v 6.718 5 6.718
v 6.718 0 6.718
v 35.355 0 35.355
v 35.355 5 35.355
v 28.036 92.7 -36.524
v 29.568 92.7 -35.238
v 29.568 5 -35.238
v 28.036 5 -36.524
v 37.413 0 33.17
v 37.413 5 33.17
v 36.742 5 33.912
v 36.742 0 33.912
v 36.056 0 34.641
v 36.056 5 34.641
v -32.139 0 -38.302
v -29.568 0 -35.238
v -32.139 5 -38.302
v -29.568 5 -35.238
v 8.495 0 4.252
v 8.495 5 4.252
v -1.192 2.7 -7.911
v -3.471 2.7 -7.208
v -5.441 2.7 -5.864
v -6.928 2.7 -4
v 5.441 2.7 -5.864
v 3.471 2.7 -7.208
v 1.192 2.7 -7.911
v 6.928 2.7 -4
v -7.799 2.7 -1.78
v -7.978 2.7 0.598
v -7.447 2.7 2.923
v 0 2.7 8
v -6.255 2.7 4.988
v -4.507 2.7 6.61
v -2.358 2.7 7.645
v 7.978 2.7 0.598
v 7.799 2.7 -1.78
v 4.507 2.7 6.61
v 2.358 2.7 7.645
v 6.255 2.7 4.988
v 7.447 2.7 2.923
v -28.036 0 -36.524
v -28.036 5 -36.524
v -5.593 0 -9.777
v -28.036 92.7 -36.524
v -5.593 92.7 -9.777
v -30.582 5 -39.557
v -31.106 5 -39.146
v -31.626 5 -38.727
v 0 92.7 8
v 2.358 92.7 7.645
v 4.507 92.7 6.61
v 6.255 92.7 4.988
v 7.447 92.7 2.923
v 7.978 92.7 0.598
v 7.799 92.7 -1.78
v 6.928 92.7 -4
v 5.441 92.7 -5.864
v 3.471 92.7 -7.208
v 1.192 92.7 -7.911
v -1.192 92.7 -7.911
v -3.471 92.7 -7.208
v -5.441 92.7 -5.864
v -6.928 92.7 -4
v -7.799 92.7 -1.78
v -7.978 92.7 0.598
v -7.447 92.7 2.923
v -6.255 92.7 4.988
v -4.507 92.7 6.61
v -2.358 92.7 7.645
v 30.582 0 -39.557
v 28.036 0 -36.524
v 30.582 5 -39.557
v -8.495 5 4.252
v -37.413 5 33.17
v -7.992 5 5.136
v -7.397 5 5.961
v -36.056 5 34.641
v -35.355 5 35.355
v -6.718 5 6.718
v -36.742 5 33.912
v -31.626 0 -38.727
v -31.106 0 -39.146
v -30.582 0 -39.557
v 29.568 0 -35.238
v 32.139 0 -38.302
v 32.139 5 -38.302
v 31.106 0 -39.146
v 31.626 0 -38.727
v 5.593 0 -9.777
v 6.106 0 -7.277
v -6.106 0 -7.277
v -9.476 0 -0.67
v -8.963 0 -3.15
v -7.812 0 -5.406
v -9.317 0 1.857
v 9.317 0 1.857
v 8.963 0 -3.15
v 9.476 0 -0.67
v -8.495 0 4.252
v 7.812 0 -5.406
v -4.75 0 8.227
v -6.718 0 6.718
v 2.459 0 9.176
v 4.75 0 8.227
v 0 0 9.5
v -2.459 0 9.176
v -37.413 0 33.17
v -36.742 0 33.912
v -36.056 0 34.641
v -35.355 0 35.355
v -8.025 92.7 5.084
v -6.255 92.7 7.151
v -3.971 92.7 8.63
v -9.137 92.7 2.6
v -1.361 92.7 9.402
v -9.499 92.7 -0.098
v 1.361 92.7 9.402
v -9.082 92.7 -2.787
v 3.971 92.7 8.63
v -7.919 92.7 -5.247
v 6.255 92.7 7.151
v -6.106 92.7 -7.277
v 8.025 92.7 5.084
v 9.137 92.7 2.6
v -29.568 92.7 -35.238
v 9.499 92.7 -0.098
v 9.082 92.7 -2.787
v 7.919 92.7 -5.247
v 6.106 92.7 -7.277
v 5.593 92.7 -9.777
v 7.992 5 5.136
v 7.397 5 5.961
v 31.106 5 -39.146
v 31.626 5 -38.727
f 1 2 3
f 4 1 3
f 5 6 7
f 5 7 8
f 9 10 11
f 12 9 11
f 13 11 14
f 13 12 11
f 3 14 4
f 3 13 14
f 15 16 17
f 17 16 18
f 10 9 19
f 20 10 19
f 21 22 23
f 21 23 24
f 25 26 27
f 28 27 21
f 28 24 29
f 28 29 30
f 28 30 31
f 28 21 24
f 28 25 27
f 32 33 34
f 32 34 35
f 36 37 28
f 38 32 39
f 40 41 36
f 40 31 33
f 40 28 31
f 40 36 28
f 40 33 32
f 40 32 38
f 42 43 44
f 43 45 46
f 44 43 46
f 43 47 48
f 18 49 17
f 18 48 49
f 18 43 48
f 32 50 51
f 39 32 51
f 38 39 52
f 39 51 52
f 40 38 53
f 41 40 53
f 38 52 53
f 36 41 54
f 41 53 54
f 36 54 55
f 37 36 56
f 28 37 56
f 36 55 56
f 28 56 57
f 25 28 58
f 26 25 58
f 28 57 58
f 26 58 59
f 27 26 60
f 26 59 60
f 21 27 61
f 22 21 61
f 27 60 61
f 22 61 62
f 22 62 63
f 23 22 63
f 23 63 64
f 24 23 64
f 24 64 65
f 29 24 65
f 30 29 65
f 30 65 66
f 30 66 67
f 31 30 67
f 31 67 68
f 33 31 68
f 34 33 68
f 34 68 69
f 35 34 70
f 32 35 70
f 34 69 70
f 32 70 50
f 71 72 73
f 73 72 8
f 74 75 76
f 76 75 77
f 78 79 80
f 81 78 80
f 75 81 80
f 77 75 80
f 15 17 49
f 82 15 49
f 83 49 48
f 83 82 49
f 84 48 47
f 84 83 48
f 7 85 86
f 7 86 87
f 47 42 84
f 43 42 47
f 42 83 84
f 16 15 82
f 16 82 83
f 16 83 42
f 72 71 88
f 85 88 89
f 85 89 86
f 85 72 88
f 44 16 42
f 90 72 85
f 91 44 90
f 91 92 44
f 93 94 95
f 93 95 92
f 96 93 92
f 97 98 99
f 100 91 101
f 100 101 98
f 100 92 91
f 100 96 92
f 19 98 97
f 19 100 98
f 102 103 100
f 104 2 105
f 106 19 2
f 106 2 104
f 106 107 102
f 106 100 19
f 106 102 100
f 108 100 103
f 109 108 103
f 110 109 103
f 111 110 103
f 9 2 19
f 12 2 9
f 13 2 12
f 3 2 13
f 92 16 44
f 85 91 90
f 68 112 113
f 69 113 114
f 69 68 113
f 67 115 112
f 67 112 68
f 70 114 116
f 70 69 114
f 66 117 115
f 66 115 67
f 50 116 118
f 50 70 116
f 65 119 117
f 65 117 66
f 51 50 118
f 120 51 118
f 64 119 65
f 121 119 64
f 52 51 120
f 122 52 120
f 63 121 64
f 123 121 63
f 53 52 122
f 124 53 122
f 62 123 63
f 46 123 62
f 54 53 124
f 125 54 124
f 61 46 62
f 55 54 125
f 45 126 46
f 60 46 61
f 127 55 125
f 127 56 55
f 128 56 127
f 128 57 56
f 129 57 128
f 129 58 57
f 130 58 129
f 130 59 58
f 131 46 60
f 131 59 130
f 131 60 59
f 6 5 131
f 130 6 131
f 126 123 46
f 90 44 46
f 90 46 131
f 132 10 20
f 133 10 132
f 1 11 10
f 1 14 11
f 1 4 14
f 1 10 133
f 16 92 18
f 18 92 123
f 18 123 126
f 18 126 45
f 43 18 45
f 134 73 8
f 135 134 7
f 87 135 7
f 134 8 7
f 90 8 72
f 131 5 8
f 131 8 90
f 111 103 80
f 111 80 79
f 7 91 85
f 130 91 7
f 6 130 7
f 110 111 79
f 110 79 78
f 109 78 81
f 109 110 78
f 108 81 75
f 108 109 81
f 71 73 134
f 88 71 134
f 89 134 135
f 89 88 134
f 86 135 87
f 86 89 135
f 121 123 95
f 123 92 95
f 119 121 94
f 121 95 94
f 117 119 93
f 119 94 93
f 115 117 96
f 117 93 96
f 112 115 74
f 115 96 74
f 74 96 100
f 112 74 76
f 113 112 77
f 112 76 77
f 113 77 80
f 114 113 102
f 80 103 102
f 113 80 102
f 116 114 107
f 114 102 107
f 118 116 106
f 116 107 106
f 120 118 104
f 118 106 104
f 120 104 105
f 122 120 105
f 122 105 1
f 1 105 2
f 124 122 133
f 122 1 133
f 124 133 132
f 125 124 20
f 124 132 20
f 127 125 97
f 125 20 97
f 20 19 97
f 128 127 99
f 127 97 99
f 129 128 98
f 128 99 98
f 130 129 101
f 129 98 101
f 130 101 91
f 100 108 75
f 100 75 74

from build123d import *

# Parameters (mm, degrees)
SKETCH1_R           = 9.5
BOSS_EXTRUDE1_DEPTH = 92.7
EXTRUDE_THIN1_DEPTH = 92.7
SKETCH13_W          = 2
SKETCH13_H          = 5
BOSS_EXTRUDE8_DEPTH = 5
EXTRUDE_THIN3_DEPTH = 5
SKETCH15_W          = 12.212964584
SKETCH15_H          = 2.5
BOSS_EXTRUDE9_DEPTH = 92.7
SKETCH16_R          = 8
CUT_EXTRUDE1_DEPTH  = 90
SKETCH17_R          = 55
SKETCH17_R_2        = 50
CUT_EXTRUDE2_DEPTH  = 5


with BuildPart() as part:
    # Sketch1 → Boss-Extrude1 (new body)
    with BuildSketch(Plane(origin=(0, 0, 0), x_dir=(1, 0, 0), z_dir=(0, 1, 0))):
        with Locations(Location((0, 0, 0), (0, 0, 270))):
            Circle(SKETCH1_R)
    extrude(amount=BOSS_EXTRUDE1_DEPTH)

    # Sketch2 → Extrude-Thin1 (add)
    with BuildSketch(Plane(origin=(0, 92.7, 0), x_dir=(1, 0, 0), z_dir=(0, 1, 0))):
        Polygon((0, 0), (-29.568230046, 35.238044383), (-28.036141159, 36.523619603), (1.532088886, 1.285575219), align=None)
    extrude_thin1 = extrude(amount=-EXTRUDE_THIN1_DEPTH)

    # Sketch13 → Boss-Extrude8 (add)
    with BuildSketch(Plane(origin=(-29.568230046, 0, -35.238044383), x_dir=(-0.7660444431189722, 0, 0.6427876096865464), z_dir=(-0.6427876096865464, 0, -0.7660444431189722))):
        with Locations((-1, 2.5)):
            Rectangle(SKETCH13_W, SKETCH13_H)
    boss_extrude8 = extrude(amount=BOSS_EXTRUDE8_DEPTH)

    # Mirror1: Extrude-Thin1, Boss-Extrude8 across plane
    add(extrude_thin1.mirror(Plane(origin=(0, 0, 0), x_dir=(0, 0, 1), z_dir=(1, 0, 0))))
    add(boss_extrude8.mirror(Plane(origin=(0, 0, 0), x_dir=(0, 0, 1), z_dir=(1, 0, 0))))

    # Sketch14 → Extrude-Thin3 (add)
    with BuildSketch(Plane.XZ):
        Polygon((0, 0), (36.062445841, 36.062445841), (38.183766184, 33.941125497), (2.121320344, -2.121320344), align=None)
    extrude_thin3 = extrude(amount=-EXTRUDE_THIN3_DEPTH)

    # Mirror6: Extrude-Thin3 across plane
    add(extrude_thin3.mirror(Plane(origin=(0, 0, 0), x_dir=(0, 0, 1), z_dir=(1, 0, 0))))

    # Sketch15 → Boss-Extrude9 (add)
    with BuildSketch(Plane.XZ):
        with Locations((0, -8.52742221)):
            Rectangle(SKETCH15_W, SKETCH15_H)
    extrude(amount=-BOSS_EXTRUDE9_DEPTH)

    # Sketch16 → Cut-Extrude1 (cut)
    with BuildSketch(Plane(origin=(0, 92.7, 0), x_dir=(1, 0, 0), z_dir=(0, 1, 0))):
        with Locations(Location((0, 0, 0), (0, 0, 270))):
            Circle(SKETCH16_R)
    extrude(amount=-CUT_EXTRUDE1_DEPTH, mode=Mode.SUBTRACT)

    # Sketch17 → Cut-Extrude2 (cut)
    with BuildSketch(Plane.XZ):
        Circle(SKETCH17_R)
        Circle(SKETCH17_R_2, mode=Mode.SUBTRACT)
    extrude(amount=-CUT_EXTRUDE2_DEPTH, mode=Mode.SUBTRACT)


solid = part.part
